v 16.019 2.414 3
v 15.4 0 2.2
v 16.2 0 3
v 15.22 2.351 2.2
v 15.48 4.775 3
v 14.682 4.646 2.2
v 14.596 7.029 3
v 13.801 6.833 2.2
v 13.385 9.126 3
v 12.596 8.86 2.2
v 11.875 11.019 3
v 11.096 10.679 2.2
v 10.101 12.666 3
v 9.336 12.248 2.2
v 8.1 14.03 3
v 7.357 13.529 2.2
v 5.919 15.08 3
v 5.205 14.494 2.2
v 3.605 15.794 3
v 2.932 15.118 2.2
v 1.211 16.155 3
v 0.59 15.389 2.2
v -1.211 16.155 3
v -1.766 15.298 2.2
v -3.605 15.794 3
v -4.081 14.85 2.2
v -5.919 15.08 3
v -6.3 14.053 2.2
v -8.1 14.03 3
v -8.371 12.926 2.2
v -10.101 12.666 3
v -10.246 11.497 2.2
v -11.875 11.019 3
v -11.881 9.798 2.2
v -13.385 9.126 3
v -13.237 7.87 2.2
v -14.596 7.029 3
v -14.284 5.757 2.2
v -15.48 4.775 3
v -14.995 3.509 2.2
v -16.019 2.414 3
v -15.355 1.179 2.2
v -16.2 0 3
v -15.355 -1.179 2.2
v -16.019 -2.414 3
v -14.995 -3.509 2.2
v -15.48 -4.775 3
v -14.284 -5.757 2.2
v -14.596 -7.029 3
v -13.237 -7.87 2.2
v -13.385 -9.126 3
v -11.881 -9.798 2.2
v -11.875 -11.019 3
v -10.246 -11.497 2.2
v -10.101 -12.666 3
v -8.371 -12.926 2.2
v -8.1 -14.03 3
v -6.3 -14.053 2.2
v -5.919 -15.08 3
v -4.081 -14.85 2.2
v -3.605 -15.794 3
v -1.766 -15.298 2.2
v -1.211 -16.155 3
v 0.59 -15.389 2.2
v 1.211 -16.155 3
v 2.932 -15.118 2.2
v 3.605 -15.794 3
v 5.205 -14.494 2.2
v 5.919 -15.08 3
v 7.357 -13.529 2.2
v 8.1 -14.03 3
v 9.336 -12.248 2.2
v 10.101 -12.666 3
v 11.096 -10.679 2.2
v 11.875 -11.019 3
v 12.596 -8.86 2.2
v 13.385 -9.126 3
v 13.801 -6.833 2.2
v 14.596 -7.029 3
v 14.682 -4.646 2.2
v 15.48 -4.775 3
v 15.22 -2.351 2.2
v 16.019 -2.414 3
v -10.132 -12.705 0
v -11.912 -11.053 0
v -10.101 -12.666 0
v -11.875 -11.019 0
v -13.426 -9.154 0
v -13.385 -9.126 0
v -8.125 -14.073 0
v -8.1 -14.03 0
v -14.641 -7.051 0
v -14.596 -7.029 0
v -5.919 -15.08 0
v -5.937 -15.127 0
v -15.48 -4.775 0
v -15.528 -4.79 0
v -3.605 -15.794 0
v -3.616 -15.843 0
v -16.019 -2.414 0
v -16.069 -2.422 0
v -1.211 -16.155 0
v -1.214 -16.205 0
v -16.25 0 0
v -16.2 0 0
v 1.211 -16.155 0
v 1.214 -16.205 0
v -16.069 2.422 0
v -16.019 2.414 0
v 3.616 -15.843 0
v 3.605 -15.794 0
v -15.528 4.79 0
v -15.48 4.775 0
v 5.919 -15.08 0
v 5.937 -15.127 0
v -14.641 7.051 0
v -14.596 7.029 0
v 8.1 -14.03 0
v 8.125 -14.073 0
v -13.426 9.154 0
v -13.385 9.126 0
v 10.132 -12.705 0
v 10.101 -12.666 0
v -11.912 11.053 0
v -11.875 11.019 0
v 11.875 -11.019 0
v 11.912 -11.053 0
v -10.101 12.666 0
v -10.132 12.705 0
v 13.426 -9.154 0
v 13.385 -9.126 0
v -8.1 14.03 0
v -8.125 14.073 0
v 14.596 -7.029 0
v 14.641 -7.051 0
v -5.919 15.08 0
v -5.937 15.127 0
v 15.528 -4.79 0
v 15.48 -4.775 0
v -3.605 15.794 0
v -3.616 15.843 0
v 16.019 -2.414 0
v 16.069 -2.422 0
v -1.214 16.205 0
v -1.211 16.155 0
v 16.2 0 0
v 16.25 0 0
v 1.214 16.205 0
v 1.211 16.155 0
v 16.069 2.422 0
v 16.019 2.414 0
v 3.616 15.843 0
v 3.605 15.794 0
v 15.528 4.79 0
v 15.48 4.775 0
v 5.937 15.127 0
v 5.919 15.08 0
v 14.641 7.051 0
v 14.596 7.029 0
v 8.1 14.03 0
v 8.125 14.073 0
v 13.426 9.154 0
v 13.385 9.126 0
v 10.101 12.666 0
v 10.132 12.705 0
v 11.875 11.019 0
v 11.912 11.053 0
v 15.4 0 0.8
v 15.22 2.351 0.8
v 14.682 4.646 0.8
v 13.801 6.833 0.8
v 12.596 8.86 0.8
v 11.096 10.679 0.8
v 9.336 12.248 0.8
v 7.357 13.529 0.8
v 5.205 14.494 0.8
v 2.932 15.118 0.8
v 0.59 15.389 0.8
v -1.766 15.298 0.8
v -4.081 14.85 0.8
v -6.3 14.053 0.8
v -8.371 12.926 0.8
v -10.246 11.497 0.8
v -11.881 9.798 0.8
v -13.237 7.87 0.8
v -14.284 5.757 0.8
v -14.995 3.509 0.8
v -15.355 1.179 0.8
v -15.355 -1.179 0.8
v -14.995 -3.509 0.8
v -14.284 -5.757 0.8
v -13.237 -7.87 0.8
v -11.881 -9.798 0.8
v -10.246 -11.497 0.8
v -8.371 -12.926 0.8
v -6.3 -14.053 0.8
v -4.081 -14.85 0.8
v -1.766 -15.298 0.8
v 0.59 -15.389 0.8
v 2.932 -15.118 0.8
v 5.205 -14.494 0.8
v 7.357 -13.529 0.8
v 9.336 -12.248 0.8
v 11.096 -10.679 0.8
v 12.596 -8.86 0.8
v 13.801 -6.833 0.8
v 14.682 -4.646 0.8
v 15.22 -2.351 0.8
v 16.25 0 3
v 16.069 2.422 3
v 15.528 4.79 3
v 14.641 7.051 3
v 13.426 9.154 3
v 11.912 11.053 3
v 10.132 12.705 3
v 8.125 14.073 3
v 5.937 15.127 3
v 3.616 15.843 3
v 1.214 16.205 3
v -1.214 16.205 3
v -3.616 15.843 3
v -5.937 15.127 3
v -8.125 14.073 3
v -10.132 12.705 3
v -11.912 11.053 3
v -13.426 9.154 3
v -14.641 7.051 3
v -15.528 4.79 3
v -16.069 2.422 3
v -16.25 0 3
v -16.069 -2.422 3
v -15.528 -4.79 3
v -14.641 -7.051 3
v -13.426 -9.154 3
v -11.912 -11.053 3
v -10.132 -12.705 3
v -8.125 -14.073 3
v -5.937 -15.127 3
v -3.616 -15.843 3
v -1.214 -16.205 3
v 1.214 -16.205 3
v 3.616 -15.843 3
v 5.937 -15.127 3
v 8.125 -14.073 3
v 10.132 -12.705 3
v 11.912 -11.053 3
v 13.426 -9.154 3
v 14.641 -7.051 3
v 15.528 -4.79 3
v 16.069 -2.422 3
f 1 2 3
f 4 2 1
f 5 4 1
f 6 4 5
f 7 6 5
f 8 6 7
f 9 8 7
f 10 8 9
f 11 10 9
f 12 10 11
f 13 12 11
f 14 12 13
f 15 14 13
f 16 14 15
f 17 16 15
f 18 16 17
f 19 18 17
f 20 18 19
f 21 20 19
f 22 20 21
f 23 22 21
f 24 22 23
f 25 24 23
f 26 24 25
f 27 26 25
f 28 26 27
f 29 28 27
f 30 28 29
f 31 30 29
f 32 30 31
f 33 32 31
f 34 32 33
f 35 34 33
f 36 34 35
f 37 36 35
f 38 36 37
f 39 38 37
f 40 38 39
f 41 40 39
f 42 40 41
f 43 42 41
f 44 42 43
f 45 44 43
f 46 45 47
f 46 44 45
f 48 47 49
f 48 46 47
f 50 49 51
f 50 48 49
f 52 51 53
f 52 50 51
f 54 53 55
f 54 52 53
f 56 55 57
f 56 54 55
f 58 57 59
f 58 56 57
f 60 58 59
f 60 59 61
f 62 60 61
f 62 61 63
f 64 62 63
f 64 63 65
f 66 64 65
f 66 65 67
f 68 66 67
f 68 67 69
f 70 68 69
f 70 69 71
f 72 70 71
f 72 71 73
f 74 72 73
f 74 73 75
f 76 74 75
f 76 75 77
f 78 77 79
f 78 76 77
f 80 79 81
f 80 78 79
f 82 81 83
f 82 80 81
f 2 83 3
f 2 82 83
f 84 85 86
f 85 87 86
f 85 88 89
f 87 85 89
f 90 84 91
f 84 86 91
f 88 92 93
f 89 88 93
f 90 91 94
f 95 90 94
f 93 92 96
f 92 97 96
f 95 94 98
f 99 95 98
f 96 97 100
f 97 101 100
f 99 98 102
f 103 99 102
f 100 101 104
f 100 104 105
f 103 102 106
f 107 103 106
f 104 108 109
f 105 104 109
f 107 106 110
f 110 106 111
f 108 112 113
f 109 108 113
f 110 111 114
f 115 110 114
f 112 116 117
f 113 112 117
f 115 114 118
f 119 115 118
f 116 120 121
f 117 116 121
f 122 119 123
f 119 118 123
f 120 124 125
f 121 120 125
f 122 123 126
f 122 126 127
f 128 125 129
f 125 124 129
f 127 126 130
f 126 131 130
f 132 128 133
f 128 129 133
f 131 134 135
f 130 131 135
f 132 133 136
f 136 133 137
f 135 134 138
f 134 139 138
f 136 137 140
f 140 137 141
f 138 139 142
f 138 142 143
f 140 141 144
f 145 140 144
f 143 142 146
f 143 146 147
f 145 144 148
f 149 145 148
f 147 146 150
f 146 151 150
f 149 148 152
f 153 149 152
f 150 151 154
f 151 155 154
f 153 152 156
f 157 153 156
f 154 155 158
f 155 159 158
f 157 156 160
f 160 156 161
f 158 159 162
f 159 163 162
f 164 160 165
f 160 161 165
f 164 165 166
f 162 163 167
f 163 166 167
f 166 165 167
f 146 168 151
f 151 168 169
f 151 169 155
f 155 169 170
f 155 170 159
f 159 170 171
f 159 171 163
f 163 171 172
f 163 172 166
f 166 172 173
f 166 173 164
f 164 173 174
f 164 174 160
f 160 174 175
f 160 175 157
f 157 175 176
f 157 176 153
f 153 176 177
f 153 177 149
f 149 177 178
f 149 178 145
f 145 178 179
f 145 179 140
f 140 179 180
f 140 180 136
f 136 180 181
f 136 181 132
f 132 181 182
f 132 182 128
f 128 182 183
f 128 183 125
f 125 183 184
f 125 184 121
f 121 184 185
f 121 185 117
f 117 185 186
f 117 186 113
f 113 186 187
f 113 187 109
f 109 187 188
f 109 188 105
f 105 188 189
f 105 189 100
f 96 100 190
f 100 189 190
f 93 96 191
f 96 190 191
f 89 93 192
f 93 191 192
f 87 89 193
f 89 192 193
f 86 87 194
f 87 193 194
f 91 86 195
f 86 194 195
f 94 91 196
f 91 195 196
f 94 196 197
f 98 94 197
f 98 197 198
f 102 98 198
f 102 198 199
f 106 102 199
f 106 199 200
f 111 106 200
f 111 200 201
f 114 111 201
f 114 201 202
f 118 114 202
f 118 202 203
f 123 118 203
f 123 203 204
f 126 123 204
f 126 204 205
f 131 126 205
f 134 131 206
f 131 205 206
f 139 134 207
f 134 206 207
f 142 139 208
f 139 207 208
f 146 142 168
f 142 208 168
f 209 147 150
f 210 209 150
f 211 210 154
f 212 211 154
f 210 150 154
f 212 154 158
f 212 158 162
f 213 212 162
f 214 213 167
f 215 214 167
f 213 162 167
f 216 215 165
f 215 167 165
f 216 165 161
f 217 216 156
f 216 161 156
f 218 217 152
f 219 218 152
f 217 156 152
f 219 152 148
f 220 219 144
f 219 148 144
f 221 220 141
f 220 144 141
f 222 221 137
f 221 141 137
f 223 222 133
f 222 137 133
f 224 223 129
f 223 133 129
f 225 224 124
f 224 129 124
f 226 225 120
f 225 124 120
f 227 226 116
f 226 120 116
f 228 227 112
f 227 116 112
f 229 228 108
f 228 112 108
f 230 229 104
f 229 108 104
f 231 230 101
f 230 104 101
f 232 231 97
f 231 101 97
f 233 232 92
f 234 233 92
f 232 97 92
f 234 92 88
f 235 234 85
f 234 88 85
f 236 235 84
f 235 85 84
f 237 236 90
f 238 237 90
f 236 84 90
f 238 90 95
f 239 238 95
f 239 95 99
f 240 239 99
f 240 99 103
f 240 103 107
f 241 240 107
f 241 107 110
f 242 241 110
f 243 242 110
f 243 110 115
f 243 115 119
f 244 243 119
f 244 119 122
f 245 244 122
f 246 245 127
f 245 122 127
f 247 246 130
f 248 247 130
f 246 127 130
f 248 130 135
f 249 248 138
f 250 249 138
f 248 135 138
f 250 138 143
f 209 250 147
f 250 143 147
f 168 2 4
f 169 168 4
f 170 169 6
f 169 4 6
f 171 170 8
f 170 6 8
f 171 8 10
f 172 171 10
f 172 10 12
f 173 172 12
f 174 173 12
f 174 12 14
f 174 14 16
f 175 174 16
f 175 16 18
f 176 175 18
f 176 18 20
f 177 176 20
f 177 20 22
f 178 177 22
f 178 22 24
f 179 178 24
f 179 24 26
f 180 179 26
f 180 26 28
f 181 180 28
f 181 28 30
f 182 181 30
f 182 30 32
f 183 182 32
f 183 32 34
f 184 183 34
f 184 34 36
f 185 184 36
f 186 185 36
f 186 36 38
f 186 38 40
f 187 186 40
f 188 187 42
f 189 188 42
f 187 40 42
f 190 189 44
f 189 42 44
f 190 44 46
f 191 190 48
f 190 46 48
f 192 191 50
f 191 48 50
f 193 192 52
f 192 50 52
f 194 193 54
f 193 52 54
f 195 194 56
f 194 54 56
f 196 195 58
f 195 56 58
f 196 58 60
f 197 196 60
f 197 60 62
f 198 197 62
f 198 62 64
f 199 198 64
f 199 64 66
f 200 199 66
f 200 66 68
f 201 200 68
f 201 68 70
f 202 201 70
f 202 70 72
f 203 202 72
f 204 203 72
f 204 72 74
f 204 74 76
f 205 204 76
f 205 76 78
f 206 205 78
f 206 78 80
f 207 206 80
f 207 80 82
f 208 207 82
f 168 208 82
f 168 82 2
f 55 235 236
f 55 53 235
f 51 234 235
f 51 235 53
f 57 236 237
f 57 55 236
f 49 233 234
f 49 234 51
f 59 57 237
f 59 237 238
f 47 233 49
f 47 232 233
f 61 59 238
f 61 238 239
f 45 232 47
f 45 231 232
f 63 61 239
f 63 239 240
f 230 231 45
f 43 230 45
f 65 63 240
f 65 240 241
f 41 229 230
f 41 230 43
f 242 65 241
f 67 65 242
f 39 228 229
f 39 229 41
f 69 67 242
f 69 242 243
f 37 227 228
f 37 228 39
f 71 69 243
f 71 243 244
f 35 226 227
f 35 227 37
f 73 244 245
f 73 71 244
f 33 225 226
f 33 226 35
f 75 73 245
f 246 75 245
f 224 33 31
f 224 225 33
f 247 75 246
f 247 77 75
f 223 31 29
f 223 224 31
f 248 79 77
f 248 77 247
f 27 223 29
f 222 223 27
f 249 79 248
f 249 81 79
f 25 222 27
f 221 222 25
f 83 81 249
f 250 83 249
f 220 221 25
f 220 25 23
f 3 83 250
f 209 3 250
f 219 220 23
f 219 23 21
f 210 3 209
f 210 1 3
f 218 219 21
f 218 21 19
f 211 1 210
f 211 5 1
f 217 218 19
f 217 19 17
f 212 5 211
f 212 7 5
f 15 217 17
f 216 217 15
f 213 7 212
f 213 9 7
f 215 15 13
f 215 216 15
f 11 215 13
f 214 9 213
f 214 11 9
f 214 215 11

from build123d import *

# Parameters (mm, degrees)
F0_R     = 16.25
F1_DEPTH = 3
F2_R     = 15.4
F3_DEPTH = 3.001
F4_SIZE  = 0.8


with BuildPart() as f1:
    # F0 (on Top) → F1 (new body)
    with BuildSketch(Plane.XY):
        Circle(F0_R)
    extrude(amount=F1_DEPTH)

    # F2 (on face) → F3 (cut, through all)
    with BuildSketch(Plane.XY.offset(3)):
        Circle(F2_R)
    extrude(amount=-F3_DEPTH, mode=Mode.SUBTRACT)

    # F4
    f4_edges = [f1.edges().sort_by_distance(p)[0] for p in [
        (-15.4, 0, 3),
        (-15.4, 0, 0),
    ]]
    chamfer(f4_edges, length=F4_SIZE)


solid = f1.part
